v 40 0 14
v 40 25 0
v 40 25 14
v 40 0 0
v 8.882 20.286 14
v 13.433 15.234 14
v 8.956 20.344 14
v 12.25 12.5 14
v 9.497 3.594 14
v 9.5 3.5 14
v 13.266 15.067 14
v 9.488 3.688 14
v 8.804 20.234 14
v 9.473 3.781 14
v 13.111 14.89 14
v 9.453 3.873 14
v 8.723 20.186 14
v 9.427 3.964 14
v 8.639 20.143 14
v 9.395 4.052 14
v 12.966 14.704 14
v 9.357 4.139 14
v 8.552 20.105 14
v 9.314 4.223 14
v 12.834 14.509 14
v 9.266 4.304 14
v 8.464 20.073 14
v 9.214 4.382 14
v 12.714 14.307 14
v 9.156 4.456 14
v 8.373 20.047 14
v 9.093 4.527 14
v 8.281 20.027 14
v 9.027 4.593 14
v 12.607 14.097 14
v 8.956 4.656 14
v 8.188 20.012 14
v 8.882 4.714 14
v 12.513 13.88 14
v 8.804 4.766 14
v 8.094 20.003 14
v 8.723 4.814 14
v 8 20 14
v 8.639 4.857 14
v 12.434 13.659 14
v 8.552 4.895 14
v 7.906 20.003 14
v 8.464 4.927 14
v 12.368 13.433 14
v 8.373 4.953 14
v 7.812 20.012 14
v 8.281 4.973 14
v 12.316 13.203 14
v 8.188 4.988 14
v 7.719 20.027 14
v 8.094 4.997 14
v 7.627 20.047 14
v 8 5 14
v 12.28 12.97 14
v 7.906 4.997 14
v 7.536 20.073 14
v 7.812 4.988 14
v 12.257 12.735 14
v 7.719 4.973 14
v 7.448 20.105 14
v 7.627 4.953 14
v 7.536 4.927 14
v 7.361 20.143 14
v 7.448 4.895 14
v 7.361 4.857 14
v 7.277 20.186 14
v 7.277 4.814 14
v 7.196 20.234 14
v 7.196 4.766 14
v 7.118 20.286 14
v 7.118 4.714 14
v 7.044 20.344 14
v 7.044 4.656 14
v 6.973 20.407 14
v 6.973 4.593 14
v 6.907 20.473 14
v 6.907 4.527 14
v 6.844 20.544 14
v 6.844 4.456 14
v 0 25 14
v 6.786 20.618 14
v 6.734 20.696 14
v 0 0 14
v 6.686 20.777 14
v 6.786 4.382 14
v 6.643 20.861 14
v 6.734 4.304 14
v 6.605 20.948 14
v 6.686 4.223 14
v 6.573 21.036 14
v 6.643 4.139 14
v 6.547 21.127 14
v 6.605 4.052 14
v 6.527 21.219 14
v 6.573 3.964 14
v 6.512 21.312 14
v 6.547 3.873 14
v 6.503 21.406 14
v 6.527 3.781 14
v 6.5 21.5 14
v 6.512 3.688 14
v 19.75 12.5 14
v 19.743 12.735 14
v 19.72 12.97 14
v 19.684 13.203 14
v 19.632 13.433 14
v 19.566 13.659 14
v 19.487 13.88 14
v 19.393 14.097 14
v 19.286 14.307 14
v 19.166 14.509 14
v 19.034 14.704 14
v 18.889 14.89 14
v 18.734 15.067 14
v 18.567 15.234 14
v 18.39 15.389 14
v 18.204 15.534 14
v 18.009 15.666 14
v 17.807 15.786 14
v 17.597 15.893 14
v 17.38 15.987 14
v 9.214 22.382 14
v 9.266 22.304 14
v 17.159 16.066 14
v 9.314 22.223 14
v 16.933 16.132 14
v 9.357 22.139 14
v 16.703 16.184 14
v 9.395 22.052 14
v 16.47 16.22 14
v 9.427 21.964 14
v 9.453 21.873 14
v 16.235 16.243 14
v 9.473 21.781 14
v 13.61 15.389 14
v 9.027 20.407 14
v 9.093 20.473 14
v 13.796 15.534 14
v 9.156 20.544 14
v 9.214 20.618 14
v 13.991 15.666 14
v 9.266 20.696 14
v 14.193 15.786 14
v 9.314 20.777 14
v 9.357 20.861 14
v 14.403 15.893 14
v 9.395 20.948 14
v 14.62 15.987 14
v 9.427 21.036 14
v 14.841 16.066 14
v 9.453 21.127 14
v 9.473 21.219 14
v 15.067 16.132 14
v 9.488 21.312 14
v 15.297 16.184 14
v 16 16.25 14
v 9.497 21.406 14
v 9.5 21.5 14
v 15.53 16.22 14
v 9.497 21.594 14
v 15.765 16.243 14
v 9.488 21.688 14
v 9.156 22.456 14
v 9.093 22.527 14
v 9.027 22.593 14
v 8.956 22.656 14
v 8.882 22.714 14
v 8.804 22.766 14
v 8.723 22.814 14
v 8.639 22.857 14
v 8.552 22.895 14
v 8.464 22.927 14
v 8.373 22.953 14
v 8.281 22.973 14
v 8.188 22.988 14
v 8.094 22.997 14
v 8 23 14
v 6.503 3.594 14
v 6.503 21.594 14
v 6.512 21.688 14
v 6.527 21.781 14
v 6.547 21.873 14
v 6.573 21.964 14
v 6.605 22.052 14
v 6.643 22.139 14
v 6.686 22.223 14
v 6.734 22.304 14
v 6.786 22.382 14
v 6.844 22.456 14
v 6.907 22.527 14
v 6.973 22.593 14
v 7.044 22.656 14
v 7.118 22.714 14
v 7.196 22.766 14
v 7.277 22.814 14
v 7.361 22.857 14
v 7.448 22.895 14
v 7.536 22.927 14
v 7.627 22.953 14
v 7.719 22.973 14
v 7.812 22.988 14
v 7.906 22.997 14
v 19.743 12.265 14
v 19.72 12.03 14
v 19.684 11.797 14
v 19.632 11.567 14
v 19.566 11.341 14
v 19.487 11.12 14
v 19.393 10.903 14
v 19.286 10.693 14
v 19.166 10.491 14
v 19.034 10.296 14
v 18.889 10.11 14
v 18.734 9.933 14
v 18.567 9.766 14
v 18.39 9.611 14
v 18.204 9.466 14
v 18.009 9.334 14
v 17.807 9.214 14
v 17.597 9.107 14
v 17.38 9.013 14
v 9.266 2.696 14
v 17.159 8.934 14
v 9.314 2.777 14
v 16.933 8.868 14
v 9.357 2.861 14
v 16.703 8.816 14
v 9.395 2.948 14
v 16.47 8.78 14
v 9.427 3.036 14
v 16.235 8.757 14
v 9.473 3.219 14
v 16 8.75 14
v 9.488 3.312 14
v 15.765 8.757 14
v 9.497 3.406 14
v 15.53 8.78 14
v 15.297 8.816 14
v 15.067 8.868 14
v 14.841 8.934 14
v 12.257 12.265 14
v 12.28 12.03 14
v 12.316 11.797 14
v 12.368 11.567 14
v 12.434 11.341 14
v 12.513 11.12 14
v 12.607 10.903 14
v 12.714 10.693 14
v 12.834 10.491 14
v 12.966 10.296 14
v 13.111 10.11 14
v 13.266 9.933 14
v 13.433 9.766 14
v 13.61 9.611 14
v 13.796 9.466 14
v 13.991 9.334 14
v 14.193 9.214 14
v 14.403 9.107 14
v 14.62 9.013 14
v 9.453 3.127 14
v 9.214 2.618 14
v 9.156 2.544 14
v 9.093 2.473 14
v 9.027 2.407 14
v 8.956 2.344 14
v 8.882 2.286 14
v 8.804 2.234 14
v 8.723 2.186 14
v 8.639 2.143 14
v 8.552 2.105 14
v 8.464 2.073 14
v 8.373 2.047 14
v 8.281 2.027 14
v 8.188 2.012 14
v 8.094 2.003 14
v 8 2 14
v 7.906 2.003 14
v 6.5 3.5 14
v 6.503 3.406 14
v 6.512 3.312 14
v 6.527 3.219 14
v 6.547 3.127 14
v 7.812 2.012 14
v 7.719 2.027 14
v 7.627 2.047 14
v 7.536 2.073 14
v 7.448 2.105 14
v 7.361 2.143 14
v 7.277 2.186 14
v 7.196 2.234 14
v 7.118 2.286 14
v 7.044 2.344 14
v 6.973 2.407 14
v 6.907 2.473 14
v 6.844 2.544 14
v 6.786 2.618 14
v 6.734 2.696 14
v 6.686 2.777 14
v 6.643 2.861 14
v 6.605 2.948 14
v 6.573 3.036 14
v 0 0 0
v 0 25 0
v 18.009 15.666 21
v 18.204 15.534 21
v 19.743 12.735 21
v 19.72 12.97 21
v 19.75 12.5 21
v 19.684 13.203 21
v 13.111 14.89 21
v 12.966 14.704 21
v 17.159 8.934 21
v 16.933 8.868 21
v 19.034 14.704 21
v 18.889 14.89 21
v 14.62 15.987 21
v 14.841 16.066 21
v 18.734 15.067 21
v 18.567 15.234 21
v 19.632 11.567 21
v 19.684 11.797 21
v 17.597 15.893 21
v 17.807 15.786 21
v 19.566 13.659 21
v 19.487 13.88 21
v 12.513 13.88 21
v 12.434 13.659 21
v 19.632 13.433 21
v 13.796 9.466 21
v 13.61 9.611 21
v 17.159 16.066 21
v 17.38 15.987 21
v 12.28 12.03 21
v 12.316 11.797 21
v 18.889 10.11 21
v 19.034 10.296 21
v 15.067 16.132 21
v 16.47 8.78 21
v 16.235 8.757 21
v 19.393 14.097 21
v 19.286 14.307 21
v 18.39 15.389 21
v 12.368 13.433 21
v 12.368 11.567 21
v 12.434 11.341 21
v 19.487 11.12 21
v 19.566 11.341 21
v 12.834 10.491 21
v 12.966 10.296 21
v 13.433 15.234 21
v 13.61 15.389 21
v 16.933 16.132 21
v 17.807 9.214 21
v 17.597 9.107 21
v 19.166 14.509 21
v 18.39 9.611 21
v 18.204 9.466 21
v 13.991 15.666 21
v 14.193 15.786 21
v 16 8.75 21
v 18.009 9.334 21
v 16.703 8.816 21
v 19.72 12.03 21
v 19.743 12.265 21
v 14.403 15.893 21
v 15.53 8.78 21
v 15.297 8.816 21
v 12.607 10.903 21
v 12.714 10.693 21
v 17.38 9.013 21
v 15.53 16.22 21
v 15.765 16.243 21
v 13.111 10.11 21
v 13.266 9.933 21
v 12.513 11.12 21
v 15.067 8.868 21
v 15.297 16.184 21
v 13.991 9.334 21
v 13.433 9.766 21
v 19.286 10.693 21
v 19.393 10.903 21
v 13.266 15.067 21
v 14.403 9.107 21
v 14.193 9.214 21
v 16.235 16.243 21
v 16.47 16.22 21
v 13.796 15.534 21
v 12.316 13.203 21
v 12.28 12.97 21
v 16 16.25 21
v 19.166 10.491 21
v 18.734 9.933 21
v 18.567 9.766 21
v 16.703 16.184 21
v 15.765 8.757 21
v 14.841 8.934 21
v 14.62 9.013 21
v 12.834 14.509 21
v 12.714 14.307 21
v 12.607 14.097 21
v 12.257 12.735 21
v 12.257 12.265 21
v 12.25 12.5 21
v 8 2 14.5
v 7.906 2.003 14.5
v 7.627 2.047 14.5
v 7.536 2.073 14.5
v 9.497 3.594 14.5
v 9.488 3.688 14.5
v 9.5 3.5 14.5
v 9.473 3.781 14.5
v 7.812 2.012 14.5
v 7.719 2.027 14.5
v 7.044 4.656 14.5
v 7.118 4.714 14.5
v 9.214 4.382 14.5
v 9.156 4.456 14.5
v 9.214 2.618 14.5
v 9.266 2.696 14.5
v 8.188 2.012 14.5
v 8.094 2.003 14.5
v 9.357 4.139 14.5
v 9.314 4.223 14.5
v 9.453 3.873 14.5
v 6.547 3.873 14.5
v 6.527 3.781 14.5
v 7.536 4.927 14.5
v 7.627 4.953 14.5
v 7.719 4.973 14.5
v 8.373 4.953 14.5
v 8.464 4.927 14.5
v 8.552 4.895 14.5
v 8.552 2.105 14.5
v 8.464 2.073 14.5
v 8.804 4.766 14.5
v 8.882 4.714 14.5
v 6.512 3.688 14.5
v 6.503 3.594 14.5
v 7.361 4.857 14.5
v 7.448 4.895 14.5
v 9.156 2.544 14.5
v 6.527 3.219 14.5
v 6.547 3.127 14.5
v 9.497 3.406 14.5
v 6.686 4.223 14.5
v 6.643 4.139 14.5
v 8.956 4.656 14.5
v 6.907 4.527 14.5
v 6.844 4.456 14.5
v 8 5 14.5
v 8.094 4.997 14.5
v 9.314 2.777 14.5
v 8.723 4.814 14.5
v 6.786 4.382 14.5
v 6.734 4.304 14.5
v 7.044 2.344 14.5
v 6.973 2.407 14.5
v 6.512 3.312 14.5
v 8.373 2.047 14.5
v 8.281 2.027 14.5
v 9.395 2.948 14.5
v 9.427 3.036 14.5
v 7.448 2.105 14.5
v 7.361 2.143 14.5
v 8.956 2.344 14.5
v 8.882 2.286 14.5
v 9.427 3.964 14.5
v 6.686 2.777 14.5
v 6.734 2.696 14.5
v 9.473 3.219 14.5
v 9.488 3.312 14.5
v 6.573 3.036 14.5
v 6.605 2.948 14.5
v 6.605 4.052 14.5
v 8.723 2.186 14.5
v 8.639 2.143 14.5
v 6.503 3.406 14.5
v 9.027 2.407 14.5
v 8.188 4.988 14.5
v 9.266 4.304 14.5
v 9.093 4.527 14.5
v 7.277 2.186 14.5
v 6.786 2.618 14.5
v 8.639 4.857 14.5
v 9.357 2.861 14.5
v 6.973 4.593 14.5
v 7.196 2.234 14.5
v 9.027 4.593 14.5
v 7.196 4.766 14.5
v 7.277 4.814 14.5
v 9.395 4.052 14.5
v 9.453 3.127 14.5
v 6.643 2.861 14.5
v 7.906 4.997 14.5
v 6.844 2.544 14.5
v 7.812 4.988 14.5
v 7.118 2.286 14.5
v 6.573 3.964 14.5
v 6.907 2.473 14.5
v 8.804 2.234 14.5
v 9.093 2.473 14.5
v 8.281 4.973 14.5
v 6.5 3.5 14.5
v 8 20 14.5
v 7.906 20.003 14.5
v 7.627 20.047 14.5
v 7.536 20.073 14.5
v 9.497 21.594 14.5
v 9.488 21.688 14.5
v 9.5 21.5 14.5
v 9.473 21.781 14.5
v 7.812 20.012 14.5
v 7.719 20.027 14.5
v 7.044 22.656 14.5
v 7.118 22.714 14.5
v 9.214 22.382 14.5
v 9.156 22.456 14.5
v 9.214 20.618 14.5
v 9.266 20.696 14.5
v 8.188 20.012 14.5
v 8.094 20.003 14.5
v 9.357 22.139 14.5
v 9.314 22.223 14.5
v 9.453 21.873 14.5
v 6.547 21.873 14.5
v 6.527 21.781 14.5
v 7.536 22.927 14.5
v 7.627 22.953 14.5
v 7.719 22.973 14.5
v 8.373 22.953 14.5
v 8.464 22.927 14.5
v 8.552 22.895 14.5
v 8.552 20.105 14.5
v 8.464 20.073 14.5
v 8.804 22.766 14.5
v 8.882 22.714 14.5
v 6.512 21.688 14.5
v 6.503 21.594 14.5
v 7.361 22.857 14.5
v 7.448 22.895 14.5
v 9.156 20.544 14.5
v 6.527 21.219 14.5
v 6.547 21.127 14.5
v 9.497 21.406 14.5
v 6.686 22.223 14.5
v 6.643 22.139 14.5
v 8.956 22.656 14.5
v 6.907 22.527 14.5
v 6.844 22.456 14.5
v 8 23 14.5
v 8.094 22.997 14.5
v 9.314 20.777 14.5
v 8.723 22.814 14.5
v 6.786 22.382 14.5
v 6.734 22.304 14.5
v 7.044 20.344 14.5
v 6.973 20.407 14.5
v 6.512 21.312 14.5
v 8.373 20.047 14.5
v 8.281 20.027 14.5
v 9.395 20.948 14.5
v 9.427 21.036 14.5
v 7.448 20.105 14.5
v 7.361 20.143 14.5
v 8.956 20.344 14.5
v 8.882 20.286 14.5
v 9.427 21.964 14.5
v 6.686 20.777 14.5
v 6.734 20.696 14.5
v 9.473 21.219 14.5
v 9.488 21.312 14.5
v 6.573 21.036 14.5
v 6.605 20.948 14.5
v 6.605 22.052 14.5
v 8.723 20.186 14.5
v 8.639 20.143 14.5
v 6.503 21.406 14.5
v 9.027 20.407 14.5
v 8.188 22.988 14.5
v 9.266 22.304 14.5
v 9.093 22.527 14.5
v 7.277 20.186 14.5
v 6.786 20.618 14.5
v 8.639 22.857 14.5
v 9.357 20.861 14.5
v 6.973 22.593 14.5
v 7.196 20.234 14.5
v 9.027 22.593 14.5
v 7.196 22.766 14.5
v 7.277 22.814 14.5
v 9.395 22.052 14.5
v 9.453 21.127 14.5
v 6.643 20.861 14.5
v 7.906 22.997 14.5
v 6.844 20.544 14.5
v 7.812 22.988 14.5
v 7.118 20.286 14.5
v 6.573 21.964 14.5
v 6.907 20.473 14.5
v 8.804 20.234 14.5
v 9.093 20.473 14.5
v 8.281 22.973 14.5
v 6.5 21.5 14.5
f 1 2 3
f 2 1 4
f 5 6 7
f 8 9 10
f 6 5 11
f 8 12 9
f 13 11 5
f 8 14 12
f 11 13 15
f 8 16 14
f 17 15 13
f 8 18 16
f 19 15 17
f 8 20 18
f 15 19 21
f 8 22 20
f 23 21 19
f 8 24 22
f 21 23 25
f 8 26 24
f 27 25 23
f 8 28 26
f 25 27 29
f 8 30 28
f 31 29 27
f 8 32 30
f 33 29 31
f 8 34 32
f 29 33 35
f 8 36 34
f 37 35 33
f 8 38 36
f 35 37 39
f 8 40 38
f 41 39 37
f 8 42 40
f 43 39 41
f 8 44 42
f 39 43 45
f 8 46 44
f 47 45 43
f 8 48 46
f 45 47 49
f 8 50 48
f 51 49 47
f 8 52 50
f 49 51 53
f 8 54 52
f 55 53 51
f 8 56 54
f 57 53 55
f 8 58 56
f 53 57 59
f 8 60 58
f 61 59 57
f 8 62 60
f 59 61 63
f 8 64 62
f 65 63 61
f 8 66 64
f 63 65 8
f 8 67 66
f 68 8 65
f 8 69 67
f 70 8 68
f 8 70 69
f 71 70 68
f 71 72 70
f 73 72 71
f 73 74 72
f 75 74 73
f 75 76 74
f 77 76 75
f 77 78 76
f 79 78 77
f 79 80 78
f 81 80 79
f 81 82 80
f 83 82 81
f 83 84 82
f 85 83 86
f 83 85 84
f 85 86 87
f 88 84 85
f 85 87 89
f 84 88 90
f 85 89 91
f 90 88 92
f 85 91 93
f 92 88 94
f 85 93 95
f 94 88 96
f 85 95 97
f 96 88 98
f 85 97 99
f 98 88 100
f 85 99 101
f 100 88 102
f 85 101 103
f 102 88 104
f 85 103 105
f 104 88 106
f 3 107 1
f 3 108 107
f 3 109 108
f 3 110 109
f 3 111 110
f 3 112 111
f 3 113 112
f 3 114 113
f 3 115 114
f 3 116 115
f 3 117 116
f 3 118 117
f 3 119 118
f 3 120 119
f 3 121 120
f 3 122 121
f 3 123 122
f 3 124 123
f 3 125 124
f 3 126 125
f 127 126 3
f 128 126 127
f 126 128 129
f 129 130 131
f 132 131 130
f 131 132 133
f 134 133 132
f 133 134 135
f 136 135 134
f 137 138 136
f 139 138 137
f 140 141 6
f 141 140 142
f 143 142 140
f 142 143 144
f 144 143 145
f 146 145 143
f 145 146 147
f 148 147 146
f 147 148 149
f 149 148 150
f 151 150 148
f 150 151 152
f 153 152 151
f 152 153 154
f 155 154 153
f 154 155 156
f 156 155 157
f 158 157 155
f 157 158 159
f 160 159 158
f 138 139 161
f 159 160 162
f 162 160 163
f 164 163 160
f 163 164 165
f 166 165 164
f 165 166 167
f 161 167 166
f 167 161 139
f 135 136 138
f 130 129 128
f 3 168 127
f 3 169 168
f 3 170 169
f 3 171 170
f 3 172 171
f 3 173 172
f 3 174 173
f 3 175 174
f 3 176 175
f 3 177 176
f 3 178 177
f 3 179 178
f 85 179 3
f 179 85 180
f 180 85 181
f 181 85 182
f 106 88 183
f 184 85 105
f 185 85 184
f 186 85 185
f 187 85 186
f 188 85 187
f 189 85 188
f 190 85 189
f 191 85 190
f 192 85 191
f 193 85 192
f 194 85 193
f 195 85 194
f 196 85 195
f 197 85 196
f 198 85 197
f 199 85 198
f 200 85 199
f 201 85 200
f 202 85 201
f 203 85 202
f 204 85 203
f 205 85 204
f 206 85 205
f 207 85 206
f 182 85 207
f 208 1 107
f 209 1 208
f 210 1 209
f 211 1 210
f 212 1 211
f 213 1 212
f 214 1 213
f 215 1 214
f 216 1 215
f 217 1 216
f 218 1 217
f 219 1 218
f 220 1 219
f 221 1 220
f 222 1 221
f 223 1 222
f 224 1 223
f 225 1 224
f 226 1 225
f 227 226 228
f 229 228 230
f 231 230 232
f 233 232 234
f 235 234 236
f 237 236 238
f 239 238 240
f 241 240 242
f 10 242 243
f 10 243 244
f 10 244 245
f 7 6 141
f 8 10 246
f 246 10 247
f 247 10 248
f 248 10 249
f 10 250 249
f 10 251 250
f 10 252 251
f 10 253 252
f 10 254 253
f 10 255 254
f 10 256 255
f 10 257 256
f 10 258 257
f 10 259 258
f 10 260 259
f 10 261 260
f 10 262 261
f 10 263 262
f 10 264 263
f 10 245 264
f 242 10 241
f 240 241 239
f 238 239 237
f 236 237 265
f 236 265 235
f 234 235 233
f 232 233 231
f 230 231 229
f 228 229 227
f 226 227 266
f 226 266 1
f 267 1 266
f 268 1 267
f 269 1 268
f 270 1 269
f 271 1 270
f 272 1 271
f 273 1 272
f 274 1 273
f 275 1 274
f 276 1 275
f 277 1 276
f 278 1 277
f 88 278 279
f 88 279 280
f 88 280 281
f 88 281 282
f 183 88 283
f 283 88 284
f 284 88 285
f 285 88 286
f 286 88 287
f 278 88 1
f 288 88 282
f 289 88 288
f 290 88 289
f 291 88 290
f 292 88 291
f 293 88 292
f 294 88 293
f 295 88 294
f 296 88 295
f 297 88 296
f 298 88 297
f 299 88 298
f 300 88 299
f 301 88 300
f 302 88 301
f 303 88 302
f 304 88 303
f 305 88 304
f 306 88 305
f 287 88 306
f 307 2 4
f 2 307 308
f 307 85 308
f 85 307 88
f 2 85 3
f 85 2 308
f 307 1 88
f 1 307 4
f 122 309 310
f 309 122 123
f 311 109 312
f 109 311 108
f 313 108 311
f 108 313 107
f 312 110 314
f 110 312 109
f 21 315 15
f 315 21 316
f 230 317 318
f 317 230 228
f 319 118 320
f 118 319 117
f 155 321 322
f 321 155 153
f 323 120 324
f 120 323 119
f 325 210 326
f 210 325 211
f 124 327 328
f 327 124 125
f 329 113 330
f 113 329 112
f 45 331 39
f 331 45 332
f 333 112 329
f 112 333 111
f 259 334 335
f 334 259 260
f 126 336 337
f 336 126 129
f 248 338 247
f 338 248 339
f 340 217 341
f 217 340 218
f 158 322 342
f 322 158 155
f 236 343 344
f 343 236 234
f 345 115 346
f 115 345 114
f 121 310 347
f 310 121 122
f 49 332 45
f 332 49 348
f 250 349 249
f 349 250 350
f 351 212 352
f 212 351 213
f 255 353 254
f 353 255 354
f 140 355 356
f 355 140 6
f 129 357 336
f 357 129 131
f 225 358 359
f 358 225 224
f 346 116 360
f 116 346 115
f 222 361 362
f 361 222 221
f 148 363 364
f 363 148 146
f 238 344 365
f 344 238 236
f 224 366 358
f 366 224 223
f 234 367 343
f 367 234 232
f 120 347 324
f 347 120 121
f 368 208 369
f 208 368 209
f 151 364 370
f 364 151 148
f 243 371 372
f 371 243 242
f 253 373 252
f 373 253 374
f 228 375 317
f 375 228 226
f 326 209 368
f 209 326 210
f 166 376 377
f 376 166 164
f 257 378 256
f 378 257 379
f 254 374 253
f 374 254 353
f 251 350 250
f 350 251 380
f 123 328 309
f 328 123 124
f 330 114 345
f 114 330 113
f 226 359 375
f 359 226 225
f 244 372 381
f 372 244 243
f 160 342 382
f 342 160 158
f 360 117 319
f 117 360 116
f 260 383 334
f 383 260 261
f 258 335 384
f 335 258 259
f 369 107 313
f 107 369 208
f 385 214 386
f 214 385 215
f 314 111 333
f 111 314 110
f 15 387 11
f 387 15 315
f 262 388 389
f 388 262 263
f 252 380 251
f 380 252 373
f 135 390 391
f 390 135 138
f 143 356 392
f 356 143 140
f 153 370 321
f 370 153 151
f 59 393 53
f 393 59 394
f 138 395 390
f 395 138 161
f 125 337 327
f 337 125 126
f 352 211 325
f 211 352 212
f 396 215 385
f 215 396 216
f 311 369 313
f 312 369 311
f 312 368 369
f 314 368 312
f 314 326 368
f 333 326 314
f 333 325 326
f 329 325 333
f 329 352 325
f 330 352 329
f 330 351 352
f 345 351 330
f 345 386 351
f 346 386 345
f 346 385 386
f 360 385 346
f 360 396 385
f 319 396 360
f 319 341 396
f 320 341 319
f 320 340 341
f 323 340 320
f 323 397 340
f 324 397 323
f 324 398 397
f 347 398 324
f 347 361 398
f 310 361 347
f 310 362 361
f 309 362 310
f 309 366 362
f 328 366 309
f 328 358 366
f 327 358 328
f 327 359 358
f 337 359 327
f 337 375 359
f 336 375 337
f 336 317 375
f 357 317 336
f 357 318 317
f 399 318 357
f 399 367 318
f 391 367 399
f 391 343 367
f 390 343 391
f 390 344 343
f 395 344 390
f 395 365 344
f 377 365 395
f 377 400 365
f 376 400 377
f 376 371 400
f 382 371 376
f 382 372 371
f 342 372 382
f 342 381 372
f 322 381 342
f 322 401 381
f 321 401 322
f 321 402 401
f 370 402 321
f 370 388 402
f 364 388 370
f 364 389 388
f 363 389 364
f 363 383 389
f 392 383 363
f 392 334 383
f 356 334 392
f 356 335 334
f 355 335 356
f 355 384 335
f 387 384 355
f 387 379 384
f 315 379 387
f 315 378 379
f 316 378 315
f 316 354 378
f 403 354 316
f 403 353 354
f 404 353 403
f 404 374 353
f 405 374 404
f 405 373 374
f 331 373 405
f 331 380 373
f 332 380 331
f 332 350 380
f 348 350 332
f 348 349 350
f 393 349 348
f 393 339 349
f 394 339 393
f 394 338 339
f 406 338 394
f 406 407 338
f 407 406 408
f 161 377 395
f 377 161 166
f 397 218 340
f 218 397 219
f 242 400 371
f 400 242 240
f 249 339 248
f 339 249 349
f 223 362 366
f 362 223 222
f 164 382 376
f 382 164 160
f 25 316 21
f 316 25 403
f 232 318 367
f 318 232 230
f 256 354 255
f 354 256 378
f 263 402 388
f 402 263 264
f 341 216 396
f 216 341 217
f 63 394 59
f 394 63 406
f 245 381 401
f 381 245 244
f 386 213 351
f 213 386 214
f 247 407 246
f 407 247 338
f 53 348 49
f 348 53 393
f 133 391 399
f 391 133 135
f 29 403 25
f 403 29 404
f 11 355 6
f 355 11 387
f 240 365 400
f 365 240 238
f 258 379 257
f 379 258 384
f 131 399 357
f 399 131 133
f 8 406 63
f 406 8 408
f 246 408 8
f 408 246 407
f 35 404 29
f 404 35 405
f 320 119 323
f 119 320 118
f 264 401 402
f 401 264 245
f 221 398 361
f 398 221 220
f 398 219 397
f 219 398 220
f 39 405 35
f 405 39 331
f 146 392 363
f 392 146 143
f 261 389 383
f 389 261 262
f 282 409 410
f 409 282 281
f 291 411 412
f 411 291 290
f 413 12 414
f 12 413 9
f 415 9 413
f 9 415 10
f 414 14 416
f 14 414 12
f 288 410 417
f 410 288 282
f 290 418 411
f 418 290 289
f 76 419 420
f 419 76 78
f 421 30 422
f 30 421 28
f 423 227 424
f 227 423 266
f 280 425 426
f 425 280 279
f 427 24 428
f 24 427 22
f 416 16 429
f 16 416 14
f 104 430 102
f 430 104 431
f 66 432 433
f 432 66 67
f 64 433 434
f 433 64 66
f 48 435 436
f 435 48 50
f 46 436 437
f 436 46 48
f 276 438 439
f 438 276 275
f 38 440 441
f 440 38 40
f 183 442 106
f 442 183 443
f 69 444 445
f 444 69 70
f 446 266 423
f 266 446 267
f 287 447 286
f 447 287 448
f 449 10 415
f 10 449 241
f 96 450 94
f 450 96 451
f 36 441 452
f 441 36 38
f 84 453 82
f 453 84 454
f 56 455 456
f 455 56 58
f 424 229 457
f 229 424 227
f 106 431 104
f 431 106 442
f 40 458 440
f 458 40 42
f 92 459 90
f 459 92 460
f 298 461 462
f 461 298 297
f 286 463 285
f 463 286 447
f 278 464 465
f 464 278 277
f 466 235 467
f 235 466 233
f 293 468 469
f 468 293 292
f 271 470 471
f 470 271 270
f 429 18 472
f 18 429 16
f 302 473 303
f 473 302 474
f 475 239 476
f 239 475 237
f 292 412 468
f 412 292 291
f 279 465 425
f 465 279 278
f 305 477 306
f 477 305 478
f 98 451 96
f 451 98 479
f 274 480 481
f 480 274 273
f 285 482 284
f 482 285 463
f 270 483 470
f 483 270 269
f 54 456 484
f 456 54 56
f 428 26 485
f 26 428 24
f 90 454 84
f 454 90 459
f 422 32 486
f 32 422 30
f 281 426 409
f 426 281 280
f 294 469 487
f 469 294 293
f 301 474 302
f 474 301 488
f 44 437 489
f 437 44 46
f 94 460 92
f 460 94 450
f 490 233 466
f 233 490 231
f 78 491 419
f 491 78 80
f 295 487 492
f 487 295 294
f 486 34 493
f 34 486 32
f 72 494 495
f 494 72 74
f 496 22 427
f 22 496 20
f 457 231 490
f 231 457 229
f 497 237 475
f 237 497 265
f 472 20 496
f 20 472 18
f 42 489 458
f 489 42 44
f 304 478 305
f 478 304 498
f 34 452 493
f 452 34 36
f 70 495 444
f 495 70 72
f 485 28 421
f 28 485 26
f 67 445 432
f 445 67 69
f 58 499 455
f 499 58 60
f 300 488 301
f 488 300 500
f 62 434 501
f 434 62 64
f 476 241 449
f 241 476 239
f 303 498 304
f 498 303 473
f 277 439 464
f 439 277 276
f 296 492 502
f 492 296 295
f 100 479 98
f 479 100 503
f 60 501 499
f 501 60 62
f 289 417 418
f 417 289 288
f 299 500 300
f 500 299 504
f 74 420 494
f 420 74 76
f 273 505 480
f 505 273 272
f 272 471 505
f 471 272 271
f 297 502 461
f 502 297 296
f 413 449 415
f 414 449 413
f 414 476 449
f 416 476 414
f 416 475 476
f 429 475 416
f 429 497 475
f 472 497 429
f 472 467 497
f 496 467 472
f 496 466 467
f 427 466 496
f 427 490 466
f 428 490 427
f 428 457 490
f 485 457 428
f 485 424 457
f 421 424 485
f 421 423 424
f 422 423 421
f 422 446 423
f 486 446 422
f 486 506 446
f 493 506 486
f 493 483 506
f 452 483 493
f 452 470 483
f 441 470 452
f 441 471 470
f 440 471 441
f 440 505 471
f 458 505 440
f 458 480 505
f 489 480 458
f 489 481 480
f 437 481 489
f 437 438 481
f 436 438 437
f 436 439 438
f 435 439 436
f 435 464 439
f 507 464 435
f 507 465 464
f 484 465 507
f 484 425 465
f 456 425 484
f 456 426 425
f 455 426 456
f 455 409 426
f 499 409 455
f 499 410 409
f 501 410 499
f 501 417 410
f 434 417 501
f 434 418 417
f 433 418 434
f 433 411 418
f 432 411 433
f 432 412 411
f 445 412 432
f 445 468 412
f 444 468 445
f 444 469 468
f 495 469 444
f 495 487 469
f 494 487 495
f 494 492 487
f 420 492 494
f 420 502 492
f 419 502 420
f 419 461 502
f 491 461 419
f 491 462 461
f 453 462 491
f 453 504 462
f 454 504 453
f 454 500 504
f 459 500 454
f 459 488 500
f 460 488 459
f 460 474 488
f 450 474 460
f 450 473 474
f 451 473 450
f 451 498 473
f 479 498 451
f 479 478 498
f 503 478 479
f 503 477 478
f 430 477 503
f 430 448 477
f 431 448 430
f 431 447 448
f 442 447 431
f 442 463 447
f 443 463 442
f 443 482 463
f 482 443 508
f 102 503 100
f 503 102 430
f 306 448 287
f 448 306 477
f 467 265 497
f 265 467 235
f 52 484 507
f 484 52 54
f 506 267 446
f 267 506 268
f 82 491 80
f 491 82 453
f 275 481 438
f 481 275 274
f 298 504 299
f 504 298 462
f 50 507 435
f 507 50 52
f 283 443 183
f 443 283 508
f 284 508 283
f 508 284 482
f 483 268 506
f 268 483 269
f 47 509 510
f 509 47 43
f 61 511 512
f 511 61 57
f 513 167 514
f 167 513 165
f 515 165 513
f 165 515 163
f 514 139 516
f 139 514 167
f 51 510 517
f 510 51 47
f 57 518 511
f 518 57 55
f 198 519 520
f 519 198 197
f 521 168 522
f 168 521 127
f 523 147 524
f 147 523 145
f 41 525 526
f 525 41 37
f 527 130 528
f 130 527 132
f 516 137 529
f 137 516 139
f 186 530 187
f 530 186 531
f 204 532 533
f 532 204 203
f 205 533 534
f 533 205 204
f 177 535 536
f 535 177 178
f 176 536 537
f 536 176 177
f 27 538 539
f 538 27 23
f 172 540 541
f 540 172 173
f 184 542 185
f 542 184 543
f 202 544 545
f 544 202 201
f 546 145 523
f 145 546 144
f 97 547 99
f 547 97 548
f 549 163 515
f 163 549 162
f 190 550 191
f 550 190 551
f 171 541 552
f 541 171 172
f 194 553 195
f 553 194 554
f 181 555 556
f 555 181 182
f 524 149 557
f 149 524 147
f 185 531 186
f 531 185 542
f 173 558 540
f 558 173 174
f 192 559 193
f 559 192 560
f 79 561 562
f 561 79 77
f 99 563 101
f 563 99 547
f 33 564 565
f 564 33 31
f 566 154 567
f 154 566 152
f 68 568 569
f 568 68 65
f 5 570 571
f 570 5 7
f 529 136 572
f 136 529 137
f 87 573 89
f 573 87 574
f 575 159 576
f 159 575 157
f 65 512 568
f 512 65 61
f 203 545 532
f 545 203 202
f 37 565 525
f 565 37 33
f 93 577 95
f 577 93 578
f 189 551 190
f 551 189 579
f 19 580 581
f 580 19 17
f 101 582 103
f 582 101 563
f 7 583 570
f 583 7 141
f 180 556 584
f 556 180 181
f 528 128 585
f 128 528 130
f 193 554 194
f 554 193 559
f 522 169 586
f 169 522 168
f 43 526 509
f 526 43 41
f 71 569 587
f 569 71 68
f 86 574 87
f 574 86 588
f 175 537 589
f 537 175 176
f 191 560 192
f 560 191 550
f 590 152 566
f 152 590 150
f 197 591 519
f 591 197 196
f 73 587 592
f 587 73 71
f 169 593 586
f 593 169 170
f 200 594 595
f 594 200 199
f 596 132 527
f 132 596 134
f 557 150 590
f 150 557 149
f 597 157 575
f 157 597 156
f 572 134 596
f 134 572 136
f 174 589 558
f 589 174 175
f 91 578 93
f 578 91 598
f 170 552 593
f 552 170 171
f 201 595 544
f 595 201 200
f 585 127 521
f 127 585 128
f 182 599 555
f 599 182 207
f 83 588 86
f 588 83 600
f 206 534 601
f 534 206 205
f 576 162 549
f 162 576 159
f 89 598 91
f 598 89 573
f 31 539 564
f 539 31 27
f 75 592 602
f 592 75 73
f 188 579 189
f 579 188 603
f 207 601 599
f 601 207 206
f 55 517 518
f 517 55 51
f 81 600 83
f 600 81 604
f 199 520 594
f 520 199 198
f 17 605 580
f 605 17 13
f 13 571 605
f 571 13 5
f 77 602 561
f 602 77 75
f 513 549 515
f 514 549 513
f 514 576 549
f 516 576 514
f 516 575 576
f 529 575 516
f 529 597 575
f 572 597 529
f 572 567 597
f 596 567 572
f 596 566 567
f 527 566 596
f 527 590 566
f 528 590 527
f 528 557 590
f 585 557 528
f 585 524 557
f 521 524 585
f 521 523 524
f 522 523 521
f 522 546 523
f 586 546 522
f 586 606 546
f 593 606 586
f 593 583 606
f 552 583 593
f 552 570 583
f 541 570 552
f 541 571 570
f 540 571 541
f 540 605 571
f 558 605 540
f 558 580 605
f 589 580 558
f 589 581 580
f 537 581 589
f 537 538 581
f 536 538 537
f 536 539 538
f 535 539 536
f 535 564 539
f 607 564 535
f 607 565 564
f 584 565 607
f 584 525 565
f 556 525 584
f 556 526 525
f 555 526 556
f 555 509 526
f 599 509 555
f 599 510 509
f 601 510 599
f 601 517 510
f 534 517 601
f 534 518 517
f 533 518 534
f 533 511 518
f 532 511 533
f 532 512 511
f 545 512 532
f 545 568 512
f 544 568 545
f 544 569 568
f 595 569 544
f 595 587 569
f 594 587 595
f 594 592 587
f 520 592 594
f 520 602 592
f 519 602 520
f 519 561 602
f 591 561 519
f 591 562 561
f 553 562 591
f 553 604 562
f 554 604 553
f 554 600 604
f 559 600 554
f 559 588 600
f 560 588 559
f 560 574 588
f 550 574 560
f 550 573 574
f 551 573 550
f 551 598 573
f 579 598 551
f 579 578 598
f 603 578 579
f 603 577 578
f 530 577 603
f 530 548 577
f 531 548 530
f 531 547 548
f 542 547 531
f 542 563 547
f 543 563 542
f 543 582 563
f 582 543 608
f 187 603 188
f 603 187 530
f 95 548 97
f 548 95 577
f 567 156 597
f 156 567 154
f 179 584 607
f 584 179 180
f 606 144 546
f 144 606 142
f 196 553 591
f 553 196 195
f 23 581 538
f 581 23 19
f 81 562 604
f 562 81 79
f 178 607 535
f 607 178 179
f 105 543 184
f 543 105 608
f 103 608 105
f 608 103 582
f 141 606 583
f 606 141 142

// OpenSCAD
$fn = 100;
module noctua_speed_controller(led_height=14.5) {
  cube([40,25,14]);
  // speed dial
  translate([16,25 / 2,14]) {
    cylinder(h=7, r=3.75);
  }

  // left LED
  translate([8, 3.5, 0]) {
    cylinder(h=led_height, r=1.5);
  }

  // right LED
  translate([8, 25 - 3.5, 0]) {
    cylinder(h=led_height, r=1.5);
  }
}

noctua_speed_controller();
  // translate([8, 3.5, 0]) {
    // cylinder(h=3, r=1.5);
  // }
